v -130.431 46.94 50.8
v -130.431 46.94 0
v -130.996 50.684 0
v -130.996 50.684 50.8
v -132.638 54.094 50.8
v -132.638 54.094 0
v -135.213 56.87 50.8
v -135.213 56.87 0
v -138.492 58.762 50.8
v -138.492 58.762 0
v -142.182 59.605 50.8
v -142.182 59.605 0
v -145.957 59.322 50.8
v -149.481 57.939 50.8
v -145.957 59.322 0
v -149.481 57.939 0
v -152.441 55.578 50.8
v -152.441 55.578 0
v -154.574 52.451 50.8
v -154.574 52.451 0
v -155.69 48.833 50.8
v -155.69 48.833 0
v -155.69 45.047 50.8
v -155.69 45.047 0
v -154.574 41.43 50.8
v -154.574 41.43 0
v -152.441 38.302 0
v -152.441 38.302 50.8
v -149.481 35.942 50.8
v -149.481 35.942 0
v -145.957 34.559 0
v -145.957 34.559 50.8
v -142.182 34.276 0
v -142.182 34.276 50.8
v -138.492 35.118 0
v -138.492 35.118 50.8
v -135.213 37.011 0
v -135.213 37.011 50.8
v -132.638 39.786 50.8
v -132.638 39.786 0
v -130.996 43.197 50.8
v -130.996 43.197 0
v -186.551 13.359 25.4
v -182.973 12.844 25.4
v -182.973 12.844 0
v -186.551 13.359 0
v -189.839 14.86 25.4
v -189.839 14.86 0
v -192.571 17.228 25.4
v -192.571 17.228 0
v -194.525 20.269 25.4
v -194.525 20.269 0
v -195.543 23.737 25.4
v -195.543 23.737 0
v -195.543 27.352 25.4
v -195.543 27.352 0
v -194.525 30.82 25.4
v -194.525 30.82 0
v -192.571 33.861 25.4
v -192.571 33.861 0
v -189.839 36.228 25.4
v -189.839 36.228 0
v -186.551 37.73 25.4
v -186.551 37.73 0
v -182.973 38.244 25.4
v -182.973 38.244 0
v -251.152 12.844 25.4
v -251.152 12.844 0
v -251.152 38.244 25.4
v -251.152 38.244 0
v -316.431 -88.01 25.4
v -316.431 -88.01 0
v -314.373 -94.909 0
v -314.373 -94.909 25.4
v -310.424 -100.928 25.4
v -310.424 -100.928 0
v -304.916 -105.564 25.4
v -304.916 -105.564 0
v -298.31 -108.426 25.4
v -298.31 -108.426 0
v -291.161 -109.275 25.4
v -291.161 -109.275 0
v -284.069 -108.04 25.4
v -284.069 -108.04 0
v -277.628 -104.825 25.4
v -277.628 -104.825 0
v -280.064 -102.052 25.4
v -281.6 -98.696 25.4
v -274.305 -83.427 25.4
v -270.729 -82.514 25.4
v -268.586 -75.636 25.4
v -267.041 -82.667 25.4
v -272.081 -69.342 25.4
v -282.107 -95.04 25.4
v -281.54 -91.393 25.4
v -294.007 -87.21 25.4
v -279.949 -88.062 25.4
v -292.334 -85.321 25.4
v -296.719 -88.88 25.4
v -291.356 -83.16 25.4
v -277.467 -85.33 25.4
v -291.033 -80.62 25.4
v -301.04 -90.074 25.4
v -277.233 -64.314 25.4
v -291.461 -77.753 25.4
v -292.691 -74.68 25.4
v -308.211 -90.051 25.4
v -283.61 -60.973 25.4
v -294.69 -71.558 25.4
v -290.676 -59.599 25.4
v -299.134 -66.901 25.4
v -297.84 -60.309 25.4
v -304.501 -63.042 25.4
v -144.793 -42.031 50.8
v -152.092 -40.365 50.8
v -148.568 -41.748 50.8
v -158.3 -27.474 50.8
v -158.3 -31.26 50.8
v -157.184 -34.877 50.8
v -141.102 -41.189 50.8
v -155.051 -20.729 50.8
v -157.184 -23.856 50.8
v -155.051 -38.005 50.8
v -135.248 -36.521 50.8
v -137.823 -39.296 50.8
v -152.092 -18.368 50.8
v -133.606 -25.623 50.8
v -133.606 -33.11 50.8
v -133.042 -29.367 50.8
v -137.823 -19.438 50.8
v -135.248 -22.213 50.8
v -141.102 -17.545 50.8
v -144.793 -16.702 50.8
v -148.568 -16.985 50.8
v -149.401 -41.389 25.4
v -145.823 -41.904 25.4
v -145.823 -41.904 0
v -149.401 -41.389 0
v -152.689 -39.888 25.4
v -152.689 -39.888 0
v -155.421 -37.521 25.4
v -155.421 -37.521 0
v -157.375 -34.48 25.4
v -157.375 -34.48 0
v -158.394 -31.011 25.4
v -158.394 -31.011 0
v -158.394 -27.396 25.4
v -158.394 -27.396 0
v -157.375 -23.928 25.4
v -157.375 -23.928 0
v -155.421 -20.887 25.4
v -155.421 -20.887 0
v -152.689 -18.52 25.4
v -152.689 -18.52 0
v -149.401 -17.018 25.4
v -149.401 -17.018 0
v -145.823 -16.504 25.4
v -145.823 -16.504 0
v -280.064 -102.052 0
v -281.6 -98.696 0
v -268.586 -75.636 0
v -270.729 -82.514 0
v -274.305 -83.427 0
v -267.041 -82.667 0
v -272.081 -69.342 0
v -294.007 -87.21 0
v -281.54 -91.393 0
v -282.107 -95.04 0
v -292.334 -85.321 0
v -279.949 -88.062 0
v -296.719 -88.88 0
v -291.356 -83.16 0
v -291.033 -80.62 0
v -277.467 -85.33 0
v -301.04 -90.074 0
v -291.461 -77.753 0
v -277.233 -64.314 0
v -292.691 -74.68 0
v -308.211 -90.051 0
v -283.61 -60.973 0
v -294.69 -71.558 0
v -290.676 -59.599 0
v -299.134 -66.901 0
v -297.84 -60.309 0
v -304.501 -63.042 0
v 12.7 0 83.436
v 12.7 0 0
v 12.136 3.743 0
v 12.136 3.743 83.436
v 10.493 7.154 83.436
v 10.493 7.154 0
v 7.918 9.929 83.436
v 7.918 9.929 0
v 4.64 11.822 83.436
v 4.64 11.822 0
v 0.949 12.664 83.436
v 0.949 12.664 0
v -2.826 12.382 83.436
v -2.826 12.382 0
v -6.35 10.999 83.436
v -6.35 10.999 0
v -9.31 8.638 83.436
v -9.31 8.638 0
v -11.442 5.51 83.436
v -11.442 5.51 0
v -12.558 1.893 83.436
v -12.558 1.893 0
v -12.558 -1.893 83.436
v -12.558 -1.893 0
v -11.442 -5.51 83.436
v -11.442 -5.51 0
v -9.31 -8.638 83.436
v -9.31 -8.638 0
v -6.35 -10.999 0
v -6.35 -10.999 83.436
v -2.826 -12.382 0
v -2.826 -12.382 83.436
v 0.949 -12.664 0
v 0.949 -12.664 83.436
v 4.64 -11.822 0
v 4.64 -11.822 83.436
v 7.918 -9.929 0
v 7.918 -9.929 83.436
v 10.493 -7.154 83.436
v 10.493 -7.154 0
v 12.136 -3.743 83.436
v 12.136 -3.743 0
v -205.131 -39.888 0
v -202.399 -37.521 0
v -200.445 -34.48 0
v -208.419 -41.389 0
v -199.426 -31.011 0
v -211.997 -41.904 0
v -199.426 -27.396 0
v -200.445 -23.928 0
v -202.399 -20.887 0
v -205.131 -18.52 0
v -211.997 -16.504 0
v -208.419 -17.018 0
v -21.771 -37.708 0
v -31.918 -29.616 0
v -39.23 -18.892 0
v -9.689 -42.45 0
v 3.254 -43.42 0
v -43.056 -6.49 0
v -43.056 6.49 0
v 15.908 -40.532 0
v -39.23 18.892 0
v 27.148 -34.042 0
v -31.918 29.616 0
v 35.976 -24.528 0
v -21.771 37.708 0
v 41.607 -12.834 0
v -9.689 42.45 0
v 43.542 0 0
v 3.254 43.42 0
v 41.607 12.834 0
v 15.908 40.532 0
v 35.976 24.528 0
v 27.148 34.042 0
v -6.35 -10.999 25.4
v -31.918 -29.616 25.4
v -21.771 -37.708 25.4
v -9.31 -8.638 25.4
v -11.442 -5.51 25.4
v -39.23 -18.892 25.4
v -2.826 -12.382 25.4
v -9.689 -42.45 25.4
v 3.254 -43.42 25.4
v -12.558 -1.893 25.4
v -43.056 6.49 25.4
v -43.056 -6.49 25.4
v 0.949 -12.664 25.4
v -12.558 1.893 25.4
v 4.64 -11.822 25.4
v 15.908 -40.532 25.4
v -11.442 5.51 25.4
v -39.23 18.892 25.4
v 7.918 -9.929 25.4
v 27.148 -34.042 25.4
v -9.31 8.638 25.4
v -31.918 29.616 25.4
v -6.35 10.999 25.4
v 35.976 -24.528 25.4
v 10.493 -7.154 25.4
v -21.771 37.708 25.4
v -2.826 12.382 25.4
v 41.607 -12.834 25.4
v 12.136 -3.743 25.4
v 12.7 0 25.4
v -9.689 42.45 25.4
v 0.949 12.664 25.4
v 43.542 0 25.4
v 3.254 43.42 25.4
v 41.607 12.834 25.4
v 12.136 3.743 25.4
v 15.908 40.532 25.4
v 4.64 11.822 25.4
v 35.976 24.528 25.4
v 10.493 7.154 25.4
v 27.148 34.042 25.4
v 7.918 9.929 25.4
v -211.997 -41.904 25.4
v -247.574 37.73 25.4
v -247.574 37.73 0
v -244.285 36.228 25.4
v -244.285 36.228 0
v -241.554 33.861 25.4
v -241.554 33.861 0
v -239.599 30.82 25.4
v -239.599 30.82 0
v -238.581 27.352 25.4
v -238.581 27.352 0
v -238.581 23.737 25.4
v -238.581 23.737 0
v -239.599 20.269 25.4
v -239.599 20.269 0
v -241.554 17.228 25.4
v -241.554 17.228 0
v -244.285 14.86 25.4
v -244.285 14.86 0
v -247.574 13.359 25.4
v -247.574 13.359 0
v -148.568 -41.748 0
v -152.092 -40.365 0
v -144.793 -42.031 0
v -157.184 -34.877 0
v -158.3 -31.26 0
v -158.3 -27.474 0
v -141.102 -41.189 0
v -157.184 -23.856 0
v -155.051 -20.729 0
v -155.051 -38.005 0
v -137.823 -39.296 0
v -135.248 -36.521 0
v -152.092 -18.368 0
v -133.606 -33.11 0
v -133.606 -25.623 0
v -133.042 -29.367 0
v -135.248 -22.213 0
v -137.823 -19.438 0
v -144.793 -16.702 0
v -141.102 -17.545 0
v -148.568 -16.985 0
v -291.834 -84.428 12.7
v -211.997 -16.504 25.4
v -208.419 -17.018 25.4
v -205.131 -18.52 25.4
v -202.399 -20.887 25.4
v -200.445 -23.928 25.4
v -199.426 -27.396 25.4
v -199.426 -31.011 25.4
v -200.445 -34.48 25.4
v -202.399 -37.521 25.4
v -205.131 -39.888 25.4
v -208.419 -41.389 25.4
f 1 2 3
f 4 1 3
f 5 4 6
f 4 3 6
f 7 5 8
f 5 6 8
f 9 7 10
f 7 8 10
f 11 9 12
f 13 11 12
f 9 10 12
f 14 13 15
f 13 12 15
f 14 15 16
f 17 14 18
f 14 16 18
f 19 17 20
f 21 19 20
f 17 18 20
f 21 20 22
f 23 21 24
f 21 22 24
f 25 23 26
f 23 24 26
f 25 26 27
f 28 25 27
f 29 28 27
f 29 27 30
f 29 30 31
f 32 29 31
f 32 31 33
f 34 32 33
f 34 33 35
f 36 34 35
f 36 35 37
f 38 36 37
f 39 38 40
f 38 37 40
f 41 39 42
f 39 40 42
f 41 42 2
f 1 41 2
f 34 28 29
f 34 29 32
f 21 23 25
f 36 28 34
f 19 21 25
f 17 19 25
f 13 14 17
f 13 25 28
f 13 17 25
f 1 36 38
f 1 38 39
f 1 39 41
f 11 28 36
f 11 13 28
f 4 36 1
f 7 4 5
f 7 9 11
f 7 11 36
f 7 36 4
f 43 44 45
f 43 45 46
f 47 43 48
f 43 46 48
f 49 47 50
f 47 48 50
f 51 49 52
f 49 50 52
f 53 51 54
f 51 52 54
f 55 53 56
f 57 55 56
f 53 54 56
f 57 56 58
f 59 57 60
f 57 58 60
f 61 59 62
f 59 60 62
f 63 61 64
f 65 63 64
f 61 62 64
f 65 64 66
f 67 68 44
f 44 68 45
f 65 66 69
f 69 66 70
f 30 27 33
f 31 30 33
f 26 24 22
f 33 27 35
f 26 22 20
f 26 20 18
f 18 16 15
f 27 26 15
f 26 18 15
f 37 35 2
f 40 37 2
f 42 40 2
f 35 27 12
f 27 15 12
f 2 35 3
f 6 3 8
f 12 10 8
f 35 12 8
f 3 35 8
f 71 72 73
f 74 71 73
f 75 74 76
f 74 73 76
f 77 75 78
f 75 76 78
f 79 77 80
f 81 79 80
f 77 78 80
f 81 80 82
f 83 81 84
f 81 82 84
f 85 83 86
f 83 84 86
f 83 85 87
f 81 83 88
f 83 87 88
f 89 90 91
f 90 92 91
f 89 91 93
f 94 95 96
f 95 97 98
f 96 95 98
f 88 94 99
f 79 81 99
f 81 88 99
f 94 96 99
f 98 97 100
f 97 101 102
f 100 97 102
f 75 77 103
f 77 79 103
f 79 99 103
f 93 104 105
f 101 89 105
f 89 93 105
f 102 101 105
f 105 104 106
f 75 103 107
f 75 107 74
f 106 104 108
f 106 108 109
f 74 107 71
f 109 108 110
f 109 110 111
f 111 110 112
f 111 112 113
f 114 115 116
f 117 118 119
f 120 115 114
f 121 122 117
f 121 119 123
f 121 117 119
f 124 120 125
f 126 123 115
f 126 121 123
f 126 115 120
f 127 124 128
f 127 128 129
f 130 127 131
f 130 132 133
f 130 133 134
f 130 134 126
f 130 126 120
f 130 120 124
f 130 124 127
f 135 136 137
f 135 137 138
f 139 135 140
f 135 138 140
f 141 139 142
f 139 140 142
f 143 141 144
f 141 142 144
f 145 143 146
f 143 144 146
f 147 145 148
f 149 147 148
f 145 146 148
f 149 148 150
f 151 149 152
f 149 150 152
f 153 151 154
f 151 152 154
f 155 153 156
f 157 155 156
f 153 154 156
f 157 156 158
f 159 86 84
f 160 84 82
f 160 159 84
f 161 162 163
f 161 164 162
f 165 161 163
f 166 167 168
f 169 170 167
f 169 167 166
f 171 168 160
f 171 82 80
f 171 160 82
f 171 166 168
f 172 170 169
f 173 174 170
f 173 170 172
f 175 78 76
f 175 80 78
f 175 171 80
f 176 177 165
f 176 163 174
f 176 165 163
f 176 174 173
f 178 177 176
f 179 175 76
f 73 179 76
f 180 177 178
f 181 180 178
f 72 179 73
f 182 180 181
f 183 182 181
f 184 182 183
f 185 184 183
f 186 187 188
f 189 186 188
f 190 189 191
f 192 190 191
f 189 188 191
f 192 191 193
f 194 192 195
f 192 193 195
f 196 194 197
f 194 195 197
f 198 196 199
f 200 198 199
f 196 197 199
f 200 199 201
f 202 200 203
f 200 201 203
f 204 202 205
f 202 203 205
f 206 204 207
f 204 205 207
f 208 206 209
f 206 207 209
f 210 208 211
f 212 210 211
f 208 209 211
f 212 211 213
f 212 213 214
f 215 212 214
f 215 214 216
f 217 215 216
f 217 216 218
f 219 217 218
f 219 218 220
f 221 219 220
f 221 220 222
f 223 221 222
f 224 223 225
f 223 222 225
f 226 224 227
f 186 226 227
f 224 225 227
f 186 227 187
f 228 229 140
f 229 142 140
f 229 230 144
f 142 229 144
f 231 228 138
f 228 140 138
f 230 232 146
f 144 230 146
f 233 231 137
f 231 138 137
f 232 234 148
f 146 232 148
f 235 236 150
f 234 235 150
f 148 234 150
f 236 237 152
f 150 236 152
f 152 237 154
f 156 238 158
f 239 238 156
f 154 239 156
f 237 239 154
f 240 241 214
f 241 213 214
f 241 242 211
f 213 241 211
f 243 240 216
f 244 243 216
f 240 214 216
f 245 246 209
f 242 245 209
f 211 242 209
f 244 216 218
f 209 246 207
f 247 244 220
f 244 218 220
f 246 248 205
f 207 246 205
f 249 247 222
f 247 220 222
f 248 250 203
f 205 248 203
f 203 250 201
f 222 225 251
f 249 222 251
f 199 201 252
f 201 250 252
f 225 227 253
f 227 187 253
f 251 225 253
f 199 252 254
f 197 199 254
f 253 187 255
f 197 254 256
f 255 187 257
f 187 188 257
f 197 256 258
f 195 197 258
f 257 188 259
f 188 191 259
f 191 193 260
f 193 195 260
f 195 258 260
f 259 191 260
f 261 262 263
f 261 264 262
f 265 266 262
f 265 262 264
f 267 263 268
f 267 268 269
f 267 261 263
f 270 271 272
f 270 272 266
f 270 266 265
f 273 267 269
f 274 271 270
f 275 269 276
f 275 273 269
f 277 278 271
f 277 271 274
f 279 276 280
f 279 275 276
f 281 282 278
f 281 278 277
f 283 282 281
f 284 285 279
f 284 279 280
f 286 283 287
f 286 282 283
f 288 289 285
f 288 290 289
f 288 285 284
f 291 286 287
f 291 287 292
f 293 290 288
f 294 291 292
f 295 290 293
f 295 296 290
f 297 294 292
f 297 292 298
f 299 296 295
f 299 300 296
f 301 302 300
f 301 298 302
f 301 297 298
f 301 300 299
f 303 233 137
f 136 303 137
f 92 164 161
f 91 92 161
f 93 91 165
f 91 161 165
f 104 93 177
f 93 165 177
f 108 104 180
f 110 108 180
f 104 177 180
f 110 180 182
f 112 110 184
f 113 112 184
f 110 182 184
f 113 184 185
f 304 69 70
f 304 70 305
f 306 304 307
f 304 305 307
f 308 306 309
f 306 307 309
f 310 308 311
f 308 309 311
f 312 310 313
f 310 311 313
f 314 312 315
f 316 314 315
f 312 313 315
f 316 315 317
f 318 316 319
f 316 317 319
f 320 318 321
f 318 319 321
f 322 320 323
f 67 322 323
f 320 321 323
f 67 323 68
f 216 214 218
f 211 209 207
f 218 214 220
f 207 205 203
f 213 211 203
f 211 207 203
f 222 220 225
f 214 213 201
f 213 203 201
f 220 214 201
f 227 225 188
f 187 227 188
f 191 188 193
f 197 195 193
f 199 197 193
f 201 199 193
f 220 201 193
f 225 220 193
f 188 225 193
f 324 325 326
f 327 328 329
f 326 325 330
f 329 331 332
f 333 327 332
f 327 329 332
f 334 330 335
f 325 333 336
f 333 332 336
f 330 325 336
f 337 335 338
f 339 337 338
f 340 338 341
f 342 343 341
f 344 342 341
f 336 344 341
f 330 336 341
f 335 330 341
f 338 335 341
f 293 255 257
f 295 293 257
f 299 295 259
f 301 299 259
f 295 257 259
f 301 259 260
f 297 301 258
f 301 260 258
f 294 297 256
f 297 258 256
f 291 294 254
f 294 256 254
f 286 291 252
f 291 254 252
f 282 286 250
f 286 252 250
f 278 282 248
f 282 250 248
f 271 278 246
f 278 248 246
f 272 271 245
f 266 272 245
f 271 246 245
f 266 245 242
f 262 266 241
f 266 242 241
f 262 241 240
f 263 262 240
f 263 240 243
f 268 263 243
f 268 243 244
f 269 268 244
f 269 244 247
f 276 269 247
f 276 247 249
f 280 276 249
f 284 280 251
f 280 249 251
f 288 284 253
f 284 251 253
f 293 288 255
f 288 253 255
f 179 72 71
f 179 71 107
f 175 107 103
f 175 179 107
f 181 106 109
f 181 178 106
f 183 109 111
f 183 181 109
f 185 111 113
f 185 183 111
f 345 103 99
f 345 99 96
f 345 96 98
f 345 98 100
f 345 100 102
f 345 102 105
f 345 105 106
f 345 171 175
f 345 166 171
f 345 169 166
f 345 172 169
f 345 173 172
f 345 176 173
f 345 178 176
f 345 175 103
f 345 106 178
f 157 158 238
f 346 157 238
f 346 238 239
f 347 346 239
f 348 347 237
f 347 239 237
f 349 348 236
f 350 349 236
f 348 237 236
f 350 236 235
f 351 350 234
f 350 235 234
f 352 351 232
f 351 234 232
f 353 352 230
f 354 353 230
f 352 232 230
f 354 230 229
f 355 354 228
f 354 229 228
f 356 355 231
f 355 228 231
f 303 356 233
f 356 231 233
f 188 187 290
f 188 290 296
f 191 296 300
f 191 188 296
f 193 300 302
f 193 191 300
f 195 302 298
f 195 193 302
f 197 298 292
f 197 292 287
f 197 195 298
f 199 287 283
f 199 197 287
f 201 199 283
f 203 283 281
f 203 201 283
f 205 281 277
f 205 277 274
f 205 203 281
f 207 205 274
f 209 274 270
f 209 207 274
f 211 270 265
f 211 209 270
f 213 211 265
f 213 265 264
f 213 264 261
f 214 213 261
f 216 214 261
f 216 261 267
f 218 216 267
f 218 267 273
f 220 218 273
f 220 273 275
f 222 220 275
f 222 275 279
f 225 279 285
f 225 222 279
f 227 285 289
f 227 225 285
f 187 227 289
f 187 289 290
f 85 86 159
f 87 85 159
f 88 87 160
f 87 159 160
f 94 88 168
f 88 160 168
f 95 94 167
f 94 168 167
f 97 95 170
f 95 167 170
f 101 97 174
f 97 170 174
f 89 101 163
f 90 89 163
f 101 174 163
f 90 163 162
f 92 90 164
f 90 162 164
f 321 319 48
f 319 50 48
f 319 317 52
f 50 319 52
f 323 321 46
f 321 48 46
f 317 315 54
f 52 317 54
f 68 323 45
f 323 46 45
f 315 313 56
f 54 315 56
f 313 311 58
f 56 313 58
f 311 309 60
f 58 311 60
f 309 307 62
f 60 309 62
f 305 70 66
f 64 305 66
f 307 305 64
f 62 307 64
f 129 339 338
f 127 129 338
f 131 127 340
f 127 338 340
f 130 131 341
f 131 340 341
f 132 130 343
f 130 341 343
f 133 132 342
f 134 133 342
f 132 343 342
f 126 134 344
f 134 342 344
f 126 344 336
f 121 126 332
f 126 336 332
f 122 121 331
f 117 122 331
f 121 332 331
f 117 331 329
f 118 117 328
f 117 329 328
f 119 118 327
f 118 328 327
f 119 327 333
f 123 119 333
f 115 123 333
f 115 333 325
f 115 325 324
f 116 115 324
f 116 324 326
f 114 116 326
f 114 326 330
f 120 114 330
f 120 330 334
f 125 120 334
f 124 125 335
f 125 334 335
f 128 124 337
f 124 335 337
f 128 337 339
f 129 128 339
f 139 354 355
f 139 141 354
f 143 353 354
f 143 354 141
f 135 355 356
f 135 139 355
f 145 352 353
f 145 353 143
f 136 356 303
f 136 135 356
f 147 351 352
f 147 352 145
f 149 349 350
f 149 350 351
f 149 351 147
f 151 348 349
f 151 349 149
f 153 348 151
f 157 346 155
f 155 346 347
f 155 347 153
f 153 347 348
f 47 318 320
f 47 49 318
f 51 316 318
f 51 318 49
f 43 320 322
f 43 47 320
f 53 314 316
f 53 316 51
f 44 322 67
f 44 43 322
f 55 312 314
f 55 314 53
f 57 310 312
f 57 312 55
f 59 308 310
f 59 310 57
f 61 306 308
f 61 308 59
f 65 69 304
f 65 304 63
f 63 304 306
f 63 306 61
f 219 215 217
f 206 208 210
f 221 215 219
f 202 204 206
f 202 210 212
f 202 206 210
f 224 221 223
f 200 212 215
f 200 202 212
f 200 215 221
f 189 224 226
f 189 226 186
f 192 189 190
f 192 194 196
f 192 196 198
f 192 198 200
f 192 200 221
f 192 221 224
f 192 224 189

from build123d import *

# Parameters (mm, degrees)
F0_R      = 43.5419108218
F0_R_2    = 12.7
F1_DEPTH  = 25.4
F2_R      = 12.7
F3_DEPTH  = 83.43603
F5_DEPTH  = 25.4
F6_R      = 12.7
F7_DEPTH  = 50.8
F9_DEPTH  = 25.4
F10_R     = 12.7
F11_DEPTH = 50.8
F13_DEPTH = 25.4


with BuildPart() as f1:
    # F0 (on Top) → F1 (new body)
    with BuildSketch(Plane.XY):
        Circle(F0_R)
        Circle(F0_R_2, mode=Mode.SUBTRACT)
    extrude(amount=F1_DEPTH)


with BuildPart() as f3:
    # F2 (on Top) → F3 (new body)
    with BuildSketch(Plane.XY):
        Circle(F2_R)
    extrude(amount=F3_DEPTH)


with BuildPart() as f5:
    # F4 (on Top) → F5 (new body)
    with BuildSketch(Plane.XY):
        with BuildLine():
            Line((-182.9726426302, 38.2443016067), (-251.1515887083, 38.2443016067))
            ThreePointArc((-251.1515887083, 38.2443016067), (-238.4515887083, 25.5443016067), (-251.1515887083, 12.8443016067))
            Line((-251.1515887083, 12.8443016067), (-182.9726426302, 12.8443016067))
            ThreePointArc((-182.9726426302, 12.8443016067), (-195.6726426302, 25.5443016067), (-182.9726426302, 38.2443016067))
        make_face()
    extrude(amount=F5_DEPTH)


with BuildPart() as f7:
    # F6 (on Top) → F7 (new body)
    with BuildSketch(Plane.XY):
        with Locations((-143.131390214, 46.9402968884)):
            Circle(F6_R)
    extrude(amount=F7_DEPTH)


with BuildPart() as f9:
    # F8 (on Top) → F9 (new body)
    with BuildSketch(Plane.XY):
        with BuildLine():
            Line((-145.8231465792, -16.5038982734), (-211.9968278433, -16.5038982734))
            ThreePointArc((-211.9968278433, -16.5038982734), (-199.2968278433, -29.2038982734), (-211.9968278433, -41.9038982734))
            Line((-211.9968278433, -41.9038982734), (-145.8231465792, -41.9038982734))
            ThreePointArc((-145.8231465792, -41.9038982734), (-158.5231465792, -29.2038982734), (-145.8231465792, -16.5038982734))
        make_face()
    extrude(amount=F9_DEPTH)


with BuildPart() as f11:
    # F10 (on Top) → F11 (new body)
    with BuildSketch(Plane.XY):
        with Locations((-145.7416468478, -29.3668110708)):
            Circle(F10_R)
    extrude(amount=F11_DEPTH)


with BuildPart() as f13:
    # F12 (on Top) → F13 (new body)
    with BuildSketch(Plane.XY):
        with BuildLine():
            add(Edge.make_bspline(
                [(-316.4309012913, -88.0103122679), (-296.9360377441, -95.1055377668), (-291.834365272, -84.4284668565), (-286.7326927998, -73.7513959461), (-304.500594366, -63.0418859881)],
                knots=[4.8824621805, 4.8824621805, 4.8824621805, 6.2831853072, 6.2831853072, 7.6839084338, 7.6839084338, 7.6839084338], degree=2, weights=[1, 0.7646092118, 1, 0.7646092118, 1]))
            ThreePointArc((-316.4309012913, -88.0103122679), (-301.7171860694, -107.2352433448), (-277.628177595, -104.824629054))
            ThreePointArc((-277.628177595, -104.824629054), (-280.8661498963, -89.669252735), (-267.0408927456, -82.6669559179))
            ThreePointArc((-267.0408927456, -82.6669559179), (-280.2994898607, -62.4110680558), (-304.500594366, -63.0418859881))
        make_face()
    extrude(amount=F13_DEPTH)


solid = Compound([f1.part, f3.part, f5.part, f7.part, f9.part, f11.part, f13.part])
